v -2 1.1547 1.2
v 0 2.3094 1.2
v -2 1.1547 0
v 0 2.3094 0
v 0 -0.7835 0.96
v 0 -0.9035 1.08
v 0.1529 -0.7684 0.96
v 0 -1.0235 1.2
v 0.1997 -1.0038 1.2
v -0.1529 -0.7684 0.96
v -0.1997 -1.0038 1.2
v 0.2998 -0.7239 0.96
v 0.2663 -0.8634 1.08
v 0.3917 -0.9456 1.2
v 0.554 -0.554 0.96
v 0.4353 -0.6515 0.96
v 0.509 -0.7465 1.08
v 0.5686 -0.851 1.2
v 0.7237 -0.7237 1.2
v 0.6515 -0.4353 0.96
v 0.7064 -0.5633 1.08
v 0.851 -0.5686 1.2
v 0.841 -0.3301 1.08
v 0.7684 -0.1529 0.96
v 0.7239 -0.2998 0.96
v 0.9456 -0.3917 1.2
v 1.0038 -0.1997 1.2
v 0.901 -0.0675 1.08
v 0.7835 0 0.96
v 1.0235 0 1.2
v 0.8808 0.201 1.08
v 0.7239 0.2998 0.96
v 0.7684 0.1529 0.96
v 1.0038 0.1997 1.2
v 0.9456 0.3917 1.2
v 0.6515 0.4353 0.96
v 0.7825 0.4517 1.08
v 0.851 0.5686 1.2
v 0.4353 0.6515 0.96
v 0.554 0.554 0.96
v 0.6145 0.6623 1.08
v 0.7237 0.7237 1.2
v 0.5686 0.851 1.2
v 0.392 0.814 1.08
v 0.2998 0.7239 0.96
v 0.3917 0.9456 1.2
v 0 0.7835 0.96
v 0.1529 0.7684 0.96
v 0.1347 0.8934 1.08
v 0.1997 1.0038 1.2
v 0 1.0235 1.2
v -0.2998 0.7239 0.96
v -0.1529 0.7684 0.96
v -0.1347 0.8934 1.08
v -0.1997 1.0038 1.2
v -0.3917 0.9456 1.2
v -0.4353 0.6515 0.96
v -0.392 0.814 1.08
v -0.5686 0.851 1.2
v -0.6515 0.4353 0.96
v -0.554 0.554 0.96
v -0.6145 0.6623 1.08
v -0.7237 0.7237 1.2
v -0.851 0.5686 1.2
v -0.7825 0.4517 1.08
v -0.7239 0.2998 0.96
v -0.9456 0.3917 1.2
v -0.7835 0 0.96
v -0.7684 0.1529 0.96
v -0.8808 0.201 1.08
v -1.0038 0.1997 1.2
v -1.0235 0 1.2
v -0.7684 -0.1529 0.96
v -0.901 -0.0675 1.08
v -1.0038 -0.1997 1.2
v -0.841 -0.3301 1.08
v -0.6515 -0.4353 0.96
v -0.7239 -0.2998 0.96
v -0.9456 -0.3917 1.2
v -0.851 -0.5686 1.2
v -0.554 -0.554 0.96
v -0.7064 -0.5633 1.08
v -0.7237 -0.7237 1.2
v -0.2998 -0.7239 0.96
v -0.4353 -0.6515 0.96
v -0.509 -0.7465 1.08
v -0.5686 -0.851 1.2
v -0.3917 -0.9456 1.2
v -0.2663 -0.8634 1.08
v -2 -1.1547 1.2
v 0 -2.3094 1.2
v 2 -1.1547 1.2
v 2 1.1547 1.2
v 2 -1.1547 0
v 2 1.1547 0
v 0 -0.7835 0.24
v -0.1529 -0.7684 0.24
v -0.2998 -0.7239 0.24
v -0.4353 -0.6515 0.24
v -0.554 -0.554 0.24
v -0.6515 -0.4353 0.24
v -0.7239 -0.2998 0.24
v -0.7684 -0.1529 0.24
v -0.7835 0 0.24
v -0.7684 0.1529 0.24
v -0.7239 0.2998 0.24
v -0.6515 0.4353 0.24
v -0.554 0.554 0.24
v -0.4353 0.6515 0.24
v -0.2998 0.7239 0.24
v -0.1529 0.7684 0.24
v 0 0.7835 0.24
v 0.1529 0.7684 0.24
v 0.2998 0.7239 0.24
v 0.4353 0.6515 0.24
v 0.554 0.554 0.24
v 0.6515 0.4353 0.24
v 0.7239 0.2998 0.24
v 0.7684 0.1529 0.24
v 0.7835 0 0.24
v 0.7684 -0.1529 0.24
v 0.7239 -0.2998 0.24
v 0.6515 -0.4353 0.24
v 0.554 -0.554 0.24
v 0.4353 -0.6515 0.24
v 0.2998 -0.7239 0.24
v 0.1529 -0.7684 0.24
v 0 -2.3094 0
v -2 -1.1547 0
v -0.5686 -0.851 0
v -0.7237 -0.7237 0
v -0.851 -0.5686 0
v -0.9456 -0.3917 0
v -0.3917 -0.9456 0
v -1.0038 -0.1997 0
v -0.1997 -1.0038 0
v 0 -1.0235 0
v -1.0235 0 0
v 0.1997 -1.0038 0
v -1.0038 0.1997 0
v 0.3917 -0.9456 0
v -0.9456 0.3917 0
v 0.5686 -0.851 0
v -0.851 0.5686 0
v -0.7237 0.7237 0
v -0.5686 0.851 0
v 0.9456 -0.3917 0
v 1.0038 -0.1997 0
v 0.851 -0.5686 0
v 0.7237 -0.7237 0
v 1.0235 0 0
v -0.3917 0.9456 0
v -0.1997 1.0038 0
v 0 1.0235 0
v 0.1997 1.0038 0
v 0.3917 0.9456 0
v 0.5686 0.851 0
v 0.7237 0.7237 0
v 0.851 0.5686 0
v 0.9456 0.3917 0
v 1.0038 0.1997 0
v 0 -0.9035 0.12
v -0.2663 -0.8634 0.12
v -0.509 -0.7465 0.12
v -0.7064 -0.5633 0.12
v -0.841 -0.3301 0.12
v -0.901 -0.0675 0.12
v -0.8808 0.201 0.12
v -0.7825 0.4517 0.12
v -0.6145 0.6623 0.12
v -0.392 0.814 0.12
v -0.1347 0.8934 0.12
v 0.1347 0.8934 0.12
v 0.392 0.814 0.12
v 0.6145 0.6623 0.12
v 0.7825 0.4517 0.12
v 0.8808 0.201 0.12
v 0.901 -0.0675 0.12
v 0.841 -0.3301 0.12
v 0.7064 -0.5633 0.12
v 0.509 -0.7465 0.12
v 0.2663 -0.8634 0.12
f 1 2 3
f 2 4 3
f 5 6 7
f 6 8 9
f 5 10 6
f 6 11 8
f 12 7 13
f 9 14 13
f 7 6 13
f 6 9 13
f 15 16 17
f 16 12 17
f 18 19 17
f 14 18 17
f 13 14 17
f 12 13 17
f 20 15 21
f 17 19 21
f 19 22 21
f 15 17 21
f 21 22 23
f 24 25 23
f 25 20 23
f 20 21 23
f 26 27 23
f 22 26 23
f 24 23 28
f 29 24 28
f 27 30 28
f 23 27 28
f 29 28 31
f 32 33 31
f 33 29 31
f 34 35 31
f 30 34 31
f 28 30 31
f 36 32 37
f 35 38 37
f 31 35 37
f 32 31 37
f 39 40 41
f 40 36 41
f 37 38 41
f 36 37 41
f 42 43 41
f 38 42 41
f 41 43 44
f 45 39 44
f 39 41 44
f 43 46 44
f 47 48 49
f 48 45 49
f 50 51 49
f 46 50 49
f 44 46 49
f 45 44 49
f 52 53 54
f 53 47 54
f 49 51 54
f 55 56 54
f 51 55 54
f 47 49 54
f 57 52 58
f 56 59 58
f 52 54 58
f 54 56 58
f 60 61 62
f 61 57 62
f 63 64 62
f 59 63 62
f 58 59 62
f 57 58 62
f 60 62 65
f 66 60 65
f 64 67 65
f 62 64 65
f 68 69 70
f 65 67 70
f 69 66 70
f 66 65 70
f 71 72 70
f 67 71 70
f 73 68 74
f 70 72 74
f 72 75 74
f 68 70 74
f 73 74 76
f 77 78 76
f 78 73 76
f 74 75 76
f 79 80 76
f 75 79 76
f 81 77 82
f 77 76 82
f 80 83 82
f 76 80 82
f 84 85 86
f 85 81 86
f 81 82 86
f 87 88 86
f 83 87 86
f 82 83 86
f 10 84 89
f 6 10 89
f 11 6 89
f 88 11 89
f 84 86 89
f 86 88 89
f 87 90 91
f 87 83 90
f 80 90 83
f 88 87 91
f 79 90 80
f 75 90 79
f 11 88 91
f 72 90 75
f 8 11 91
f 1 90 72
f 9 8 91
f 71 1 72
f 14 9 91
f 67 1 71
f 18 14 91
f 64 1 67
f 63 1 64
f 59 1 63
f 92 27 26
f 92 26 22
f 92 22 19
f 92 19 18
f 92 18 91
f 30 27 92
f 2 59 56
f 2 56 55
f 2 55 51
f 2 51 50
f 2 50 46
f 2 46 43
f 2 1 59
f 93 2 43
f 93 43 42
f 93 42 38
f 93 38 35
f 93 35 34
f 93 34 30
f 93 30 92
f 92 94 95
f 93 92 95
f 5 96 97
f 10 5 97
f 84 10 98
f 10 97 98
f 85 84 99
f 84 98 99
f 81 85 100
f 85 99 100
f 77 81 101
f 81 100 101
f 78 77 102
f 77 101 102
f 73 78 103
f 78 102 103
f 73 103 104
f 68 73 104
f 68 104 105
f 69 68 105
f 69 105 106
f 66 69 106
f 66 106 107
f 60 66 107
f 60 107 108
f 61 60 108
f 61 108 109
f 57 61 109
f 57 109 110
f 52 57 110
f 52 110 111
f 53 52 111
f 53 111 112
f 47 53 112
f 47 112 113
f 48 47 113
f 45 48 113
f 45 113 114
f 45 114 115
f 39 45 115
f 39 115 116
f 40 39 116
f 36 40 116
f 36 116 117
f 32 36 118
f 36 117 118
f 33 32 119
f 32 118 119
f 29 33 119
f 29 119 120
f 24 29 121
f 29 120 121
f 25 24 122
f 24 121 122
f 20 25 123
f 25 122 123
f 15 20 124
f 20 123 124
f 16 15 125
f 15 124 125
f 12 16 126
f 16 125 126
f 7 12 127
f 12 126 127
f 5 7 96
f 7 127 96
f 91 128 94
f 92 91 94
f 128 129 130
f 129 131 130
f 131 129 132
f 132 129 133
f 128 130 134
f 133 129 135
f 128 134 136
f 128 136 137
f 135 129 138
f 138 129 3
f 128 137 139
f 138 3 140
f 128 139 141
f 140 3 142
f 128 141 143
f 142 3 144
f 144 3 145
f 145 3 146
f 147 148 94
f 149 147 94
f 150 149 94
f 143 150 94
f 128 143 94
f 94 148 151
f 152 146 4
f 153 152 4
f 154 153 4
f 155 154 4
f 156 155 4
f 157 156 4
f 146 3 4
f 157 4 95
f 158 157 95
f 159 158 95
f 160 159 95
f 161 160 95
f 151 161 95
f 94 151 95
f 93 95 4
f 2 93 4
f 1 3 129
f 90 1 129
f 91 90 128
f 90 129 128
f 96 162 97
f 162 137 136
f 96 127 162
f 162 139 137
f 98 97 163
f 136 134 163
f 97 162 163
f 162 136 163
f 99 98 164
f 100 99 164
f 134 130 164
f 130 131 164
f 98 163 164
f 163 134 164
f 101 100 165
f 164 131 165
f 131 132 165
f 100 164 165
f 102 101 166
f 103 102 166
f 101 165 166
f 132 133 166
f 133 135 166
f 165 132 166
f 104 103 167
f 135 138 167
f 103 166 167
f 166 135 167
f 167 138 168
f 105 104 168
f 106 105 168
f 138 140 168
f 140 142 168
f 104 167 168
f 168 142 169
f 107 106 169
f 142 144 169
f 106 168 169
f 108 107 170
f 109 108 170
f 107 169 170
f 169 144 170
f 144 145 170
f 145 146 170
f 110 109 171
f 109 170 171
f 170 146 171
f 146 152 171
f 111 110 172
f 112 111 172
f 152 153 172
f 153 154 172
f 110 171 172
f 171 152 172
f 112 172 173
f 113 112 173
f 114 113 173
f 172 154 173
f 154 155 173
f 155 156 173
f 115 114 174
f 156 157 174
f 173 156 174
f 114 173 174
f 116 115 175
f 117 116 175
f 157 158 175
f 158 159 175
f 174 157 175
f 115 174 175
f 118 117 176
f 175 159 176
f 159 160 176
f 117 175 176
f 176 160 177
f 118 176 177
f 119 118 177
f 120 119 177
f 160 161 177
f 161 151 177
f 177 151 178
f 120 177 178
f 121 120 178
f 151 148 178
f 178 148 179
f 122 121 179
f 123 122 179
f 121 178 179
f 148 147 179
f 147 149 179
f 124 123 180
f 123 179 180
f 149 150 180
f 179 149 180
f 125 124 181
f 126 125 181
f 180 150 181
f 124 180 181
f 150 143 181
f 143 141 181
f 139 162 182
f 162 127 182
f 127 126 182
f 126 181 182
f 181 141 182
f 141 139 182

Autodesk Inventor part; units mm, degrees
sketch "Sketch1" plane through (0, 0, 0) normal (0, 0, 1) x (1, 0, 0)
  circle A0 centre (0, 0) radius 2 construction
  line L0 (-2, 1.1547) -> (-2, -1.1547)
  line L1 (-2, -1.1547) -> (0, -2.3094)
  line L2 (0, -2.3094) -> (2, -1.1547)
  line L3 (2, -1.1547) -> (2, 1.1547)
  line L4 (2, 1.1547) -> (0, 2.3094)
  line L5 (0, 2.3094) -> (-2, 1.1547)
  line L6 (0, 3.2332) -> (0, -3.2332) projected
  line L7 (-2.8, 0) -> (2.8, 0) projected
  point P0 (0, 0)
  dimension "ParS" = 4
extrude "Extrusion1" add sketch "Sketch1" along normal blind 1.2
sketch "Sketch2" plane through (0, 0, 1.2) normal (0, 0, 1) x (1, 0, 0)
  point P0 (0, 0)
  point P1 (0, 0)
hole "Hole1" at (0, 0, 1.2) direction (0, 0, -1) diameter 1.567 end through all thread size "M2x0.4" class "6H" standard "ISO Metric profile"
ref_plane "MSC_PT1" through (0, 0, 1.2) normal (0, 0, 1) x (1, 0, 0)
ref_plane "MSC_PT2" through (0, 0, 0) normal (0, 0, -1) x (-1, 0, 0)
ref_plane "MSC_PF1" through (0, 0, 0) normal (1, 0, 0) x (0, 1, 0)
chamfer "Chamfer1" distance 0.24 angle 45 2 edges at (0, 0.7835, 1.2) (0, 0.7835, 0)
equation "\"d17\" = 0.6 * PTC"
equation "\"d18\" = 0.6 * PTC"
equation "\"d4\" = M"
equation "\"PTC\" = 0.4"
equation "\"NND\" = 2"
equation "\"THREADDIA\" = NND"
properties part number "ISO 4036 - M2" material "Steel"
